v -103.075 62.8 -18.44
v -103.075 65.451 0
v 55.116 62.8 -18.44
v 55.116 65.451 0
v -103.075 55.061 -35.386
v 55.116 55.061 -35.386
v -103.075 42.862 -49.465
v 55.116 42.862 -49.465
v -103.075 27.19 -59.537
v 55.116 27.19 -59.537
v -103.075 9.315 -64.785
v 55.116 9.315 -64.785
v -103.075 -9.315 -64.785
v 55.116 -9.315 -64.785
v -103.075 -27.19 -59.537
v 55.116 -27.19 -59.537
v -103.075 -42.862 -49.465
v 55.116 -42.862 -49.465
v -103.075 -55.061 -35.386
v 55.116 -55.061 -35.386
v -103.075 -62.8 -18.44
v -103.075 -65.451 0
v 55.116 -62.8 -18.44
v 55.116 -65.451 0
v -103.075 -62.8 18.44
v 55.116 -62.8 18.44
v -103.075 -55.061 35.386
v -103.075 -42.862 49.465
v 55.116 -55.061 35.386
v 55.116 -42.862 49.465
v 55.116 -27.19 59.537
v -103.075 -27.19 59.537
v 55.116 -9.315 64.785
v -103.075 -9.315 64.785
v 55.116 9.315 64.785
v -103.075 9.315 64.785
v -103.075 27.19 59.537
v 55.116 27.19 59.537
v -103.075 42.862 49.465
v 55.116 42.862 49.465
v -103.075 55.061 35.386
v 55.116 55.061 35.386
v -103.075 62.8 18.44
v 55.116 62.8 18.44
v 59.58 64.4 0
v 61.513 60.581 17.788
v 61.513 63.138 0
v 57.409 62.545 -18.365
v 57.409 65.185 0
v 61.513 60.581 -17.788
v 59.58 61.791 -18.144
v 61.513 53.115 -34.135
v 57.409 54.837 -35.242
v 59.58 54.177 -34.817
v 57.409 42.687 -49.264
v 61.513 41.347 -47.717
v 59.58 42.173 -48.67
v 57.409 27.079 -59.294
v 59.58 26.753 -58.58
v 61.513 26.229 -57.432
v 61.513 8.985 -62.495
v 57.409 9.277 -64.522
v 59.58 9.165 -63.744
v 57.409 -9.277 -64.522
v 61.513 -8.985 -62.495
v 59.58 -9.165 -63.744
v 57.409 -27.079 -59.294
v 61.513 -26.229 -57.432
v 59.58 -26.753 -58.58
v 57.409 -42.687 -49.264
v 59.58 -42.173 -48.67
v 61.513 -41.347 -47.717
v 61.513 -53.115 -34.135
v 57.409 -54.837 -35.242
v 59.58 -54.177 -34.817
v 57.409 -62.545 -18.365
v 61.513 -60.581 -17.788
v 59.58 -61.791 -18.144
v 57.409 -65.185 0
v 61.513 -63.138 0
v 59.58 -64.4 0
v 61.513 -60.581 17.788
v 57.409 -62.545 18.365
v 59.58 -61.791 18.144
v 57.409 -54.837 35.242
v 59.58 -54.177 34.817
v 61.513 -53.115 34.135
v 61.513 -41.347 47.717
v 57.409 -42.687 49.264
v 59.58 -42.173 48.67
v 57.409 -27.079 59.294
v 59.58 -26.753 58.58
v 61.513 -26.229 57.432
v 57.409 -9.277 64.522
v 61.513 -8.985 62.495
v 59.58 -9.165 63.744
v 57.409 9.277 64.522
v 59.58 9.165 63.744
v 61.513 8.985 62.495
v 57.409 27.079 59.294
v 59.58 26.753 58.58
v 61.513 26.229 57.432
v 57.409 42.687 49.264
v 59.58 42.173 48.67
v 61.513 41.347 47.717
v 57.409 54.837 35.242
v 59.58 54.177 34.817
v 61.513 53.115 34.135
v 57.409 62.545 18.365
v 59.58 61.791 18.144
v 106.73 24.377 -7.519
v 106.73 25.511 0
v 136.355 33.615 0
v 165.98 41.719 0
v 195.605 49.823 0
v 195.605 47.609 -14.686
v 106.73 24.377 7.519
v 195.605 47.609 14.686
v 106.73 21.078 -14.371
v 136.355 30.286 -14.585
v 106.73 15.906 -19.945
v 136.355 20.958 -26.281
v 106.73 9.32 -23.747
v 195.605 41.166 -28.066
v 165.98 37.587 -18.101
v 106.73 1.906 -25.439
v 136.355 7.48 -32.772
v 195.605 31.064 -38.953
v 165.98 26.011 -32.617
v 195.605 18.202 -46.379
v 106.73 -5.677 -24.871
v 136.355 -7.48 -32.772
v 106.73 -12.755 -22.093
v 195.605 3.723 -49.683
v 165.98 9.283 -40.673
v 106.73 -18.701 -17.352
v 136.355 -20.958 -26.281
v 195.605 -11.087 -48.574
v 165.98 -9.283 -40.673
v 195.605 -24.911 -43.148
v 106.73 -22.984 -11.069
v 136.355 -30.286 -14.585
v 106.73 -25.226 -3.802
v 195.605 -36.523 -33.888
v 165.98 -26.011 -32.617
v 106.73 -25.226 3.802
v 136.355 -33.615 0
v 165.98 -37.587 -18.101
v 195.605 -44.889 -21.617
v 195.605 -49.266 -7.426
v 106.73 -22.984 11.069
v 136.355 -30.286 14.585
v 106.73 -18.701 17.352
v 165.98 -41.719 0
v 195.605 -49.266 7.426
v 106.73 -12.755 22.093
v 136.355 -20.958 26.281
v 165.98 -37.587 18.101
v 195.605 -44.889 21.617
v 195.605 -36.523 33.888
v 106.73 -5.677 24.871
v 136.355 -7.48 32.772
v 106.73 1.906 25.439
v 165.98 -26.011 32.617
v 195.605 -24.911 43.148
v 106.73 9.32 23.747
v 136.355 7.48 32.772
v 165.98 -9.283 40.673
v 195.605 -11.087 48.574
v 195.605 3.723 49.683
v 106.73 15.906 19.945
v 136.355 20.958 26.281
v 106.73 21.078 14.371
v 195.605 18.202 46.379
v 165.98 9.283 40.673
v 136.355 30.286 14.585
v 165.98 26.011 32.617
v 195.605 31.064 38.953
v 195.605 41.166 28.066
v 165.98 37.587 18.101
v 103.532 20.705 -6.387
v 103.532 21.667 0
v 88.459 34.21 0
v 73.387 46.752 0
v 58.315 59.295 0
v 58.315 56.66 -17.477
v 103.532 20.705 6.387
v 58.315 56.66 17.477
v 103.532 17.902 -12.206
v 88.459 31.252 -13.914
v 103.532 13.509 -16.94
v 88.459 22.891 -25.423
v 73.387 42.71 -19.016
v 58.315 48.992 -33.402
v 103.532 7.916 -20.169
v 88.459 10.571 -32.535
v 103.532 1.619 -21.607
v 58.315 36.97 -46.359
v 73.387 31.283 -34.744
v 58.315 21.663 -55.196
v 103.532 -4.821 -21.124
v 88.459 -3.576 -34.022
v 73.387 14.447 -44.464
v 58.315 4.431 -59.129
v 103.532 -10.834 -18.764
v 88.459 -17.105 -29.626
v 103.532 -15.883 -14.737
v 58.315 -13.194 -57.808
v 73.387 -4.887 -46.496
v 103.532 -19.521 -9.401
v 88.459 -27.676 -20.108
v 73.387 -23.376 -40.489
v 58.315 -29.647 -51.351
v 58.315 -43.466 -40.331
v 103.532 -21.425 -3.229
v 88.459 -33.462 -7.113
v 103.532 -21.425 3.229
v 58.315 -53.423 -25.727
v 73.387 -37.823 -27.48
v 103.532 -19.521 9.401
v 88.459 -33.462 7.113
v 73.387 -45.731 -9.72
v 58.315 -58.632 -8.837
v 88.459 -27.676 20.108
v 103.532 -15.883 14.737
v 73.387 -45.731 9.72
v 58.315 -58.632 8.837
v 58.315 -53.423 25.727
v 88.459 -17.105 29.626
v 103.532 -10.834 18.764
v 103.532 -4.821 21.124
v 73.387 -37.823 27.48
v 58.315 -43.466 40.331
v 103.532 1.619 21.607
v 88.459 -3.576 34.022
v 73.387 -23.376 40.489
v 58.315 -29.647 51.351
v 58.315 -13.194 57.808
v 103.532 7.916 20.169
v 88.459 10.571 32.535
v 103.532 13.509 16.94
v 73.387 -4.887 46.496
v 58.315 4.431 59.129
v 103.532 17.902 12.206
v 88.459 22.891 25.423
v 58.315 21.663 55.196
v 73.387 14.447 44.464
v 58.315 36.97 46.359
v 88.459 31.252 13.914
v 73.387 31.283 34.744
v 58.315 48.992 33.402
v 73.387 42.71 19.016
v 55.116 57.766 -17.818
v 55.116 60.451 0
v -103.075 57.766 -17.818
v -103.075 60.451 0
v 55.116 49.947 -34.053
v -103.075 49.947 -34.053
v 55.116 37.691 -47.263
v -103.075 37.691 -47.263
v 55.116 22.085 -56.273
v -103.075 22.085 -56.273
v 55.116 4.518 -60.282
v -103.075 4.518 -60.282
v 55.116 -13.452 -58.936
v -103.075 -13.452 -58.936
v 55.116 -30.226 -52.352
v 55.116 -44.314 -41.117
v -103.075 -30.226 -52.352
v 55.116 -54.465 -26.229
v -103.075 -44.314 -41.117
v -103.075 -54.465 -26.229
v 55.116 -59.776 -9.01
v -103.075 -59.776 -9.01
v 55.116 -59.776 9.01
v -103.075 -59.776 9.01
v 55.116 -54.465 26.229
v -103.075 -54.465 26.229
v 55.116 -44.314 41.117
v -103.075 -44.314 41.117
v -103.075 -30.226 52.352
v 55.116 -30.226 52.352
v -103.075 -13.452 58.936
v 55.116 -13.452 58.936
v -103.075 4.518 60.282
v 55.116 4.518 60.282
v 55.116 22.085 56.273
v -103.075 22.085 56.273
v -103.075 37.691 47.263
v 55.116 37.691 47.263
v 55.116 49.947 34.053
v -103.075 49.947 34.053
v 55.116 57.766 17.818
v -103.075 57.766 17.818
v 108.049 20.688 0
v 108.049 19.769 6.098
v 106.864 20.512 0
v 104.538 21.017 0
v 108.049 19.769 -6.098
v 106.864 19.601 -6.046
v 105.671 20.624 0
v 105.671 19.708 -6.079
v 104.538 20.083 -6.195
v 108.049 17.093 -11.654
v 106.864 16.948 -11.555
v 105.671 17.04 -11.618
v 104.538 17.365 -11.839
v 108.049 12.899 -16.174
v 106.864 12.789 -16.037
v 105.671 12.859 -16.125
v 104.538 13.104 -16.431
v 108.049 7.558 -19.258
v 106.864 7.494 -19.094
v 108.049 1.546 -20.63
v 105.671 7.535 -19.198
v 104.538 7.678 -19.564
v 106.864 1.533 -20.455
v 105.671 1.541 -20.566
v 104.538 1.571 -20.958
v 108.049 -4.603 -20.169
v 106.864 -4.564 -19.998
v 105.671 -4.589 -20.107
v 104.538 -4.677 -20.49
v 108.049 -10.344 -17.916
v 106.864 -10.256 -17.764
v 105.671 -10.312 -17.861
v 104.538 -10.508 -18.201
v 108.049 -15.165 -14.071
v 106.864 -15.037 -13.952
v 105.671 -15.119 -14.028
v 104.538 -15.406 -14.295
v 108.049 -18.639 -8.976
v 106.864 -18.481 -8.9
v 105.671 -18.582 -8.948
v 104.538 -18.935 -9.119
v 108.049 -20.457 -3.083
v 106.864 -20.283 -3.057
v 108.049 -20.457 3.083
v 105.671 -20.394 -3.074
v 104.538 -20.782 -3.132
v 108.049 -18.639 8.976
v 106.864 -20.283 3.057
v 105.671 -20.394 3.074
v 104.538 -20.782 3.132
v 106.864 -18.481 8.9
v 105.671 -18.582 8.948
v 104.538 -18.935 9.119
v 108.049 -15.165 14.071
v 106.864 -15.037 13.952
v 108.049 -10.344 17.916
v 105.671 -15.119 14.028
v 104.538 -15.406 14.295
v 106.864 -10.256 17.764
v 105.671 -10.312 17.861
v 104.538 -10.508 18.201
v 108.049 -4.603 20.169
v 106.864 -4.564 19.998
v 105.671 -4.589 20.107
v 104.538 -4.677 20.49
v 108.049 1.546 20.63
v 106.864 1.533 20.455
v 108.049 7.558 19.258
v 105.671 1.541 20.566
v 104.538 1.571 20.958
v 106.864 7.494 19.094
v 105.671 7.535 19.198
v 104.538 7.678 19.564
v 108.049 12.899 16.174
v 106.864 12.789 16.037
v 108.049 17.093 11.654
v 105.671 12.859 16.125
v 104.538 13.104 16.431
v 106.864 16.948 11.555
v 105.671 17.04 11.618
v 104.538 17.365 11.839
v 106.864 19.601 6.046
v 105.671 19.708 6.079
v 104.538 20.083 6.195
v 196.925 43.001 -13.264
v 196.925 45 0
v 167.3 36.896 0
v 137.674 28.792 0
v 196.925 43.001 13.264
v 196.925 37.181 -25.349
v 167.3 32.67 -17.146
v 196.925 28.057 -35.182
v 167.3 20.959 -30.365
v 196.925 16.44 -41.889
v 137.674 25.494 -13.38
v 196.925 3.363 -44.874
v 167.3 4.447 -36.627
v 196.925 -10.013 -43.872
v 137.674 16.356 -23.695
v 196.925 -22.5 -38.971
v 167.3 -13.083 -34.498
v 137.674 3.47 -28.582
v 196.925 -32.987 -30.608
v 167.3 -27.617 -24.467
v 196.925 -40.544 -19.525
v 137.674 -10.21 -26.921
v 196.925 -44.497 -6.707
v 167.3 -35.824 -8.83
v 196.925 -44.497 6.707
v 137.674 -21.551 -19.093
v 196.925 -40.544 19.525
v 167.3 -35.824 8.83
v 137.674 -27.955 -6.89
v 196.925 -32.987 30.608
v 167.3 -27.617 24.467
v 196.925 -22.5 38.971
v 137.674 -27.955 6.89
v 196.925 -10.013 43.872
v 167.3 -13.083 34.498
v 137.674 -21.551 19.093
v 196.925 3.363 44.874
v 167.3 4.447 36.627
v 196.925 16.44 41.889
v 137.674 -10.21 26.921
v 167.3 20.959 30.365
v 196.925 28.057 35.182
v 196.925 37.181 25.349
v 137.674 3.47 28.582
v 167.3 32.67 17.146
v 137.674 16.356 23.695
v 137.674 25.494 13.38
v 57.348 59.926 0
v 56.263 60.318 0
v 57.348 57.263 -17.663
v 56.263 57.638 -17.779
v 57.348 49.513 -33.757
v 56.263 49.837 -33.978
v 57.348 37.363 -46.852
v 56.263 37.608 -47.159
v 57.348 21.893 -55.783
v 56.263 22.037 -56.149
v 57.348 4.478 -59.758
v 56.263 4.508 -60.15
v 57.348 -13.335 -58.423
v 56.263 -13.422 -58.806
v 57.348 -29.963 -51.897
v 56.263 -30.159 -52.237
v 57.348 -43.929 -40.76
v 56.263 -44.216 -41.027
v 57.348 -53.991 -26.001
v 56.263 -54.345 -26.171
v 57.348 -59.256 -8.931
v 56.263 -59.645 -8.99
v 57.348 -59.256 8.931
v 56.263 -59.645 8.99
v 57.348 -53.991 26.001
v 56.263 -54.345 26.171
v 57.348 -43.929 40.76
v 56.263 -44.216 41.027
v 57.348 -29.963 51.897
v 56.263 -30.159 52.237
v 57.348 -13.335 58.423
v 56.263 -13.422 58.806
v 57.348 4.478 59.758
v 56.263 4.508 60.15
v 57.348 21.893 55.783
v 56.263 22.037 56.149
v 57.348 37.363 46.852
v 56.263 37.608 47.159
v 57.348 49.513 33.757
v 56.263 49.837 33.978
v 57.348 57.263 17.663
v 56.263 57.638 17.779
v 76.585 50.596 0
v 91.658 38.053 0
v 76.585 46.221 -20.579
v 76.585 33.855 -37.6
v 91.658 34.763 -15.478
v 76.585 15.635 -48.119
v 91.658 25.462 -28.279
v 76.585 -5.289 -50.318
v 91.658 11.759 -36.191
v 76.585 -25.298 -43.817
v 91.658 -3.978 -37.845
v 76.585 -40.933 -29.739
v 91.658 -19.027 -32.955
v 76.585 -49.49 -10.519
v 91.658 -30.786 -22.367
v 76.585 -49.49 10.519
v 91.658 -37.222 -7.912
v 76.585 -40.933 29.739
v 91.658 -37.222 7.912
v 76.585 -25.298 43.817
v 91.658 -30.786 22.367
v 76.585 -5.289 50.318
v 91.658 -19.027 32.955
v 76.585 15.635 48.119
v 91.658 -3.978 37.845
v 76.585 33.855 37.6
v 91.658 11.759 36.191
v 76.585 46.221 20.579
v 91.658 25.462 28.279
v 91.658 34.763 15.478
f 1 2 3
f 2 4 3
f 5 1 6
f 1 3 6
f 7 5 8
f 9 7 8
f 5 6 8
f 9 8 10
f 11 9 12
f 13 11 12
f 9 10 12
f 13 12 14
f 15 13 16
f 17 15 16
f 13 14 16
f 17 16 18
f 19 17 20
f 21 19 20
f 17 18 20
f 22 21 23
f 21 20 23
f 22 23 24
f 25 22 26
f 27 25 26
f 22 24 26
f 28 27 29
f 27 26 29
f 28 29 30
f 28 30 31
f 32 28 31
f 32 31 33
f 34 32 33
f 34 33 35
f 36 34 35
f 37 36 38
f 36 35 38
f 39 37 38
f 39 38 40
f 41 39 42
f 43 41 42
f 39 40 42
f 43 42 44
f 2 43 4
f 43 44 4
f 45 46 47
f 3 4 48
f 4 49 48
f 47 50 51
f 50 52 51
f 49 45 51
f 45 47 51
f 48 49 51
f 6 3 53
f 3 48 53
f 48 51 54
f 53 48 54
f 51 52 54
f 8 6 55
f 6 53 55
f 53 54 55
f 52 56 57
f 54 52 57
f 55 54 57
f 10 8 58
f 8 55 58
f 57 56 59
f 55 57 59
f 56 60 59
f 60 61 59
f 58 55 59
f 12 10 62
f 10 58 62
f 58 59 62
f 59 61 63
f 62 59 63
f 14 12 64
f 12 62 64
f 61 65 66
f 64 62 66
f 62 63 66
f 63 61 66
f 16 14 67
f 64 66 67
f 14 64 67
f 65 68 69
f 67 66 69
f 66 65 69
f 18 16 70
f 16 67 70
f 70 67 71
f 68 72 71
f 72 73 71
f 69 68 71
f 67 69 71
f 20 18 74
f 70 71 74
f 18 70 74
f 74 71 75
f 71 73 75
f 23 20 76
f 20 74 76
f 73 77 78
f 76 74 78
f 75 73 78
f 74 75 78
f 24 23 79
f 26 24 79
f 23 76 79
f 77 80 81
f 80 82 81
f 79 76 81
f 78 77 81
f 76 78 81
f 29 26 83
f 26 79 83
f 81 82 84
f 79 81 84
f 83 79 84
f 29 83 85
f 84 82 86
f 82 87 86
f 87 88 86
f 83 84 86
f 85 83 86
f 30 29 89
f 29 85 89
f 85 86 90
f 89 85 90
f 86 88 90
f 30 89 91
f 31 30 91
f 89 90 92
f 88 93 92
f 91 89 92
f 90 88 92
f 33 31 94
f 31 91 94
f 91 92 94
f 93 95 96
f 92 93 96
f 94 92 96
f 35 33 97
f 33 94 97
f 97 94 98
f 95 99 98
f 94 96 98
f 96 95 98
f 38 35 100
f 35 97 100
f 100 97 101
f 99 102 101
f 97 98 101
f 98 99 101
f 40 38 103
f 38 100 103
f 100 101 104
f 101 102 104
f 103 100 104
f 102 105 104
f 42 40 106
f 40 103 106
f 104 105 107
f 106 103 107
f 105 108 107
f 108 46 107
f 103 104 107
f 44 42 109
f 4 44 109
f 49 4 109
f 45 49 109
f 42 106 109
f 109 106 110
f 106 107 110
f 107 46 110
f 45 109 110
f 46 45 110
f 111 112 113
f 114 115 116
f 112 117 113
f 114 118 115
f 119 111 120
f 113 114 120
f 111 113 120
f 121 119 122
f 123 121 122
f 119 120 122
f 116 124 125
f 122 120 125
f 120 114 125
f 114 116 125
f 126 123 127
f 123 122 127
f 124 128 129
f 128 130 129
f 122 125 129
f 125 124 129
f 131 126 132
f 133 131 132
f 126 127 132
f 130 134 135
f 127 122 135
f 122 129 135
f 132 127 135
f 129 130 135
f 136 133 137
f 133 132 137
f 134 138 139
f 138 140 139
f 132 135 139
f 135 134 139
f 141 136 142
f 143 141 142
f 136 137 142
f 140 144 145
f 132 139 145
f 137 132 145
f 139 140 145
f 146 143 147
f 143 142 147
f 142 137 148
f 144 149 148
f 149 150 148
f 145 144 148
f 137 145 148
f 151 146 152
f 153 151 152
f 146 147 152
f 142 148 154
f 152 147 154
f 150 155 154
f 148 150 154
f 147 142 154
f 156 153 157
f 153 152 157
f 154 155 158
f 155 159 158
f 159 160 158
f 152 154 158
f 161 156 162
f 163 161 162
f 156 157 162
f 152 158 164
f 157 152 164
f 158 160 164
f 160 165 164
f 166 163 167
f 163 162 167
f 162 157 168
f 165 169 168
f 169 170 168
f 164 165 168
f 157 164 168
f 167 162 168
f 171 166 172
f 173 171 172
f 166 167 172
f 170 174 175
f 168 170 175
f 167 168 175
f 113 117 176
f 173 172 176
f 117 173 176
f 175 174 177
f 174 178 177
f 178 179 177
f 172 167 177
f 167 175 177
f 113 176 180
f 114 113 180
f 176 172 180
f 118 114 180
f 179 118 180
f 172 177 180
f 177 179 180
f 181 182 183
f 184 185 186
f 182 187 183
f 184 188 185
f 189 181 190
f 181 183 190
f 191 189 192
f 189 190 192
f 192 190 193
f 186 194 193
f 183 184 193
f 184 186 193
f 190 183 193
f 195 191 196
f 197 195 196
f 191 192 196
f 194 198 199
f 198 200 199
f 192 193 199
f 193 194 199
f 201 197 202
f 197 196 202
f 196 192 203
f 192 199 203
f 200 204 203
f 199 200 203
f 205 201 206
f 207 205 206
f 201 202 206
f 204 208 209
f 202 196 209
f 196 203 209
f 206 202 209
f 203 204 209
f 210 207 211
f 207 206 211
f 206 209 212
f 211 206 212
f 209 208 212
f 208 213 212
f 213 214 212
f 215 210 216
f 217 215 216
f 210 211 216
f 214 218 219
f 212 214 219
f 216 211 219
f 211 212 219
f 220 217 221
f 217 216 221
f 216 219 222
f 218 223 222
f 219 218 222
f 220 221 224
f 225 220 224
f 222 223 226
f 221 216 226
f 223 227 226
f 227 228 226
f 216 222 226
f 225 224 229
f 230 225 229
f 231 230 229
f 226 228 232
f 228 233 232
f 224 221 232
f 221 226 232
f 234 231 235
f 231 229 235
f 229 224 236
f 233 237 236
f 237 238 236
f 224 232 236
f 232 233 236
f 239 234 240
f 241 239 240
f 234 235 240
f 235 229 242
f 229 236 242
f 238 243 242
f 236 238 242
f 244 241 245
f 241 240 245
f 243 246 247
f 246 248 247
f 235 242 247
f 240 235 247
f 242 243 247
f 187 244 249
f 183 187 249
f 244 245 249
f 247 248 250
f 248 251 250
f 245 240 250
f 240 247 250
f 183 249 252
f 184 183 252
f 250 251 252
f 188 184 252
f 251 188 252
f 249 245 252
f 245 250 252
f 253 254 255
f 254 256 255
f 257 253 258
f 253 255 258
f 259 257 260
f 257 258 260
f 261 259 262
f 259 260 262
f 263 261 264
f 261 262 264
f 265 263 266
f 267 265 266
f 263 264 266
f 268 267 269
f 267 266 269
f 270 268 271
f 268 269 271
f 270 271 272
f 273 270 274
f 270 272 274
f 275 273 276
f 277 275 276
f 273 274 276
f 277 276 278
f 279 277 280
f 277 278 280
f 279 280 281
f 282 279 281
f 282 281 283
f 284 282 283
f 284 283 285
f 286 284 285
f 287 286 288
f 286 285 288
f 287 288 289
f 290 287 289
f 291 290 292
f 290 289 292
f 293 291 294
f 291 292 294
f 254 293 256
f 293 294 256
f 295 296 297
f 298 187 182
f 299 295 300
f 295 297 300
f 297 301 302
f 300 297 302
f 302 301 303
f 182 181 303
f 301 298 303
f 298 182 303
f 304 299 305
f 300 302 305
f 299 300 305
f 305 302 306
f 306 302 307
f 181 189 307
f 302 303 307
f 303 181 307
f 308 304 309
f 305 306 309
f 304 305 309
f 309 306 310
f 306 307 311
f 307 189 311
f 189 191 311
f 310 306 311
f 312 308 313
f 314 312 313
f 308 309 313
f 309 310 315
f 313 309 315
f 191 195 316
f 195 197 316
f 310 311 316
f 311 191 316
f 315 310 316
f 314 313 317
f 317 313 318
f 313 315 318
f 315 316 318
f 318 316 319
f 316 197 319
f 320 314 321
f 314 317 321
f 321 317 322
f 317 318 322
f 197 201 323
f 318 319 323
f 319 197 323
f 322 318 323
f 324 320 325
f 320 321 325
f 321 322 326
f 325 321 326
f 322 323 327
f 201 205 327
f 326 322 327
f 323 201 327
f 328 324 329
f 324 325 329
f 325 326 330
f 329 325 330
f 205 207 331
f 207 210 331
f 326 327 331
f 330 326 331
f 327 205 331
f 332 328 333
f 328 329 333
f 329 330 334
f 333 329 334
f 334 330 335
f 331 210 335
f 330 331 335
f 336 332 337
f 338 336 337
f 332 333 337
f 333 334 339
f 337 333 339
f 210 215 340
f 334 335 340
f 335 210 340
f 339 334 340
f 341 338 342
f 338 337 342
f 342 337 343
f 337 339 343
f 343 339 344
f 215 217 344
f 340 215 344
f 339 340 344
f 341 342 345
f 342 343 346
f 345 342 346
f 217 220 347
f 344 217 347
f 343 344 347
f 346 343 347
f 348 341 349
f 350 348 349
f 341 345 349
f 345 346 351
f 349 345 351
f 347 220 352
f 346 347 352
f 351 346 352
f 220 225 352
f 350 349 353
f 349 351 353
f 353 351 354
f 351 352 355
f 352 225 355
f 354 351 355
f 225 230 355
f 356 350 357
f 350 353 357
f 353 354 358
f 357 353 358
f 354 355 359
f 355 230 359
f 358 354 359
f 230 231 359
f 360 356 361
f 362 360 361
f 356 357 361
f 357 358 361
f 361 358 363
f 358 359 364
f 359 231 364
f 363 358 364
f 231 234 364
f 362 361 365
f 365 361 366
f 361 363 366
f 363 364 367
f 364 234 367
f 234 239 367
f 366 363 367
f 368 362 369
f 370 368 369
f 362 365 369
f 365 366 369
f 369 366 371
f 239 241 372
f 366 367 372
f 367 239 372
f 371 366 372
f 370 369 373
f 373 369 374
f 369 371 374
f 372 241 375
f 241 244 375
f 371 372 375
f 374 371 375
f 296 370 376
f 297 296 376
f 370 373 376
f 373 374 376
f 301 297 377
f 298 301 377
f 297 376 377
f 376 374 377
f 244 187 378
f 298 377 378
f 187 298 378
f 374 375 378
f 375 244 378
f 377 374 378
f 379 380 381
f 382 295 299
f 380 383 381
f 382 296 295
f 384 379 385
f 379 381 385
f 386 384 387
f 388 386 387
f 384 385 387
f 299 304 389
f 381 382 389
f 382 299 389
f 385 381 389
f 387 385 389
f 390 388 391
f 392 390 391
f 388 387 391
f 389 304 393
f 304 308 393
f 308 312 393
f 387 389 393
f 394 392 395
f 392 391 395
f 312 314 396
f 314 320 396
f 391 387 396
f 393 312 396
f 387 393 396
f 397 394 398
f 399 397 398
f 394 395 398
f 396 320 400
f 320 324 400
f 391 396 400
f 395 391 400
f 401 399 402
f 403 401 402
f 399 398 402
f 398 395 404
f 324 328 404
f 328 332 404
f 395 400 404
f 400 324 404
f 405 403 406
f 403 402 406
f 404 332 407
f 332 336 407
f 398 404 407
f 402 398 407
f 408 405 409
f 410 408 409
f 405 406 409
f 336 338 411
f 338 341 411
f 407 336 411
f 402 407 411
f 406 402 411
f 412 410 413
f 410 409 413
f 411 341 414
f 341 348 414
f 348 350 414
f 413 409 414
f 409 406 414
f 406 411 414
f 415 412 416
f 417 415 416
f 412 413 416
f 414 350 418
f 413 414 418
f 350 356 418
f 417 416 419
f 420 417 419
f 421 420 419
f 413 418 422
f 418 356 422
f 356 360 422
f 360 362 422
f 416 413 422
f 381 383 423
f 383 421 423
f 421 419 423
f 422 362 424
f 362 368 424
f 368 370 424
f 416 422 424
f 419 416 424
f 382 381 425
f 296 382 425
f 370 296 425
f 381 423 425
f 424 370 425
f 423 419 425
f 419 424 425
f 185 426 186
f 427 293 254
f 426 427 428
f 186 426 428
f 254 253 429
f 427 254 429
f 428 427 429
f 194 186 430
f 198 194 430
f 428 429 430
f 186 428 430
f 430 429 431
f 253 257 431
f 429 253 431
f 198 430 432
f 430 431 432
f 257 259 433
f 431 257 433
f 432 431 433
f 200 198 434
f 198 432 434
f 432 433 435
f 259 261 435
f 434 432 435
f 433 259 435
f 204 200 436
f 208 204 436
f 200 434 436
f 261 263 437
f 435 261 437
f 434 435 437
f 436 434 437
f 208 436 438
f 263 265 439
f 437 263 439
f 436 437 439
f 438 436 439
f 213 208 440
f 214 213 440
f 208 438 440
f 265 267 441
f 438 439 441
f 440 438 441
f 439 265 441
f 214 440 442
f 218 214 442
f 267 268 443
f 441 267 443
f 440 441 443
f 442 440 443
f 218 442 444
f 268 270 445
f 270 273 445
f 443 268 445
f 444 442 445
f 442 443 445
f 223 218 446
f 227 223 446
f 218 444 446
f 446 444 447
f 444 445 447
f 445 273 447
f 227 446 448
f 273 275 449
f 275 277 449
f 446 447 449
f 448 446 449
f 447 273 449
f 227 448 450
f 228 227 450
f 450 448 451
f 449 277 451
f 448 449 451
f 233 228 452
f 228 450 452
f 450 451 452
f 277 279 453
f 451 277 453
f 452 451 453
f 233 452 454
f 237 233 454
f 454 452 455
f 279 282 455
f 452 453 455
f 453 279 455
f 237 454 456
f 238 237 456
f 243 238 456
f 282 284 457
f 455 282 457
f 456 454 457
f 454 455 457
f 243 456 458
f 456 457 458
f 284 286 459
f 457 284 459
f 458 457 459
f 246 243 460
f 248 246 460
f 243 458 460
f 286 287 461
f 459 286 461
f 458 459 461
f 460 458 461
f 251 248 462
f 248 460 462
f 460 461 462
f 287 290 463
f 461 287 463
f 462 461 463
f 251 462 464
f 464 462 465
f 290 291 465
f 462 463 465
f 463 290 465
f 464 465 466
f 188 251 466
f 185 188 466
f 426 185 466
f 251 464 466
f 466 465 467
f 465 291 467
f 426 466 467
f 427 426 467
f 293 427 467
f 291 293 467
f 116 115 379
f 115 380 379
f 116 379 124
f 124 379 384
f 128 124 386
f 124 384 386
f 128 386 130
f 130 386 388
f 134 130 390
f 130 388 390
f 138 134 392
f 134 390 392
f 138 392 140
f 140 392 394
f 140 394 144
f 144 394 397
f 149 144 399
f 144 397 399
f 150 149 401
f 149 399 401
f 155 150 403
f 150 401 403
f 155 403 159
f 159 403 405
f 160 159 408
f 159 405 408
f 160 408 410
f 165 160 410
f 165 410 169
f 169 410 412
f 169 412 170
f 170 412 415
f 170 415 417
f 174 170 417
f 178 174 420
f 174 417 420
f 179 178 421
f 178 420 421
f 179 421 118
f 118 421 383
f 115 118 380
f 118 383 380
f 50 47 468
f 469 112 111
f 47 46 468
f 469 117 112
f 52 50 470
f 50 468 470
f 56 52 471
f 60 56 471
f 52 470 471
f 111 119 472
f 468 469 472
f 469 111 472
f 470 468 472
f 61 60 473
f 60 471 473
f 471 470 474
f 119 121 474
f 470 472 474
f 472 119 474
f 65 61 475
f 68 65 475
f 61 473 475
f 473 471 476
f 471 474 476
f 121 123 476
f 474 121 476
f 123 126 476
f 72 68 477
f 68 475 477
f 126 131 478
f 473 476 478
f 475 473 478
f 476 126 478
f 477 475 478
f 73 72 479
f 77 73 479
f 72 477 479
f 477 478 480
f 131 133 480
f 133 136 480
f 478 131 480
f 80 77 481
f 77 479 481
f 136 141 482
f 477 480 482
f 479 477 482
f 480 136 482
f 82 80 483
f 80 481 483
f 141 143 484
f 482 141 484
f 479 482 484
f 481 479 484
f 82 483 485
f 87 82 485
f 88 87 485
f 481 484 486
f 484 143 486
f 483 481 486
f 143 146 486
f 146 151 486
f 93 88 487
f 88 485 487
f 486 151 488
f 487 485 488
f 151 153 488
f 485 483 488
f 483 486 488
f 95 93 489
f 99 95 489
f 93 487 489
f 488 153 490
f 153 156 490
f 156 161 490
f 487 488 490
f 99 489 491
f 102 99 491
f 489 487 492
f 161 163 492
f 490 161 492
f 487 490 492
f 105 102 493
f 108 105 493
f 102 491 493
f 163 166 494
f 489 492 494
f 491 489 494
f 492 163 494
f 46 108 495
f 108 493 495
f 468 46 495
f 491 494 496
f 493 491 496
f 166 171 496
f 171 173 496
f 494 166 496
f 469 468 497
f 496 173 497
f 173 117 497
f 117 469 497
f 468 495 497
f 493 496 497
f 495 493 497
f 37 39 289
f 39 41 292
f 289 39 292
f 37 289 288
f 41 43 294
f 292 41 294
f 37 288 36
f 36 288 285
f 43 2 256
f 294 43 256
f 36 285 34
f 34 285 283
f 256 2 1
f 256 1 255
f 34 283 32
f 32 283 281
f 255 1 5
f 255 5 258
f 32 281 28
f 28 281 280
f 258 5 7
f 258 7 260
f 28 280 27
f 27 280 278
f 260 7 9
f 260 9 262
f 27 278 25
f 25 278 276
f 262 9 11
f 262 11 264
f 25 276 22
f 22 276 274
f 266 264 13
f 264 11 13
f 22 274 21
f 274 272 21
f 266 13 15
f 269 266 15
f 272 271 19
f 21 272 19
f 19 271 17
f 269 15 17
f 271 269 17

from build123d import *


with BuildPart() as part:
    # Sketch4 → Revolve3 (revolve)
    with BuildSketch(Plane.XY):
        with BuildLine():
            Line((-103.075250338, 65.451422493), (55.11646874, 65.451422493))
            ThreePointArc((55.11646874, 65.451422493), (58.517447493, 64.855322935), (61.51296186, 63.138091197))
            Line((61.51296186, 63.138091197), (106.730008788, 25.510538776))
            Line((106.730008788, 25.510538776), (195.605450204, 49.82280509))
            Line((195.605450204, 49.82280509), (196.924749662, 45))
            Line((196.924749662, 45), (108.049308246, 20.687733685))
            ThreePointArc((108.049308246, 20.687733685), (105.670550773, 20.624072904), (103.531762227, 21.667204424))
            Line((103.531762227, 21.667204424), (58.3147153, 59.294756845))
            ThreePointArc((58.3147153, 59.294756845), (56.816958116, 60.153372714), (55.11646874, 60.451422493))
            Line((55.11646874, 60.451422493), (-103.075250338, 60.451422493))
            Line((-103.075250338, 60.451422493), (-103.075250338, 65.451422493))
        make_face()
    revolve(axis=Axis((196.924749662, 0, 0), (-1, 0, 0)))


solid = part.part
